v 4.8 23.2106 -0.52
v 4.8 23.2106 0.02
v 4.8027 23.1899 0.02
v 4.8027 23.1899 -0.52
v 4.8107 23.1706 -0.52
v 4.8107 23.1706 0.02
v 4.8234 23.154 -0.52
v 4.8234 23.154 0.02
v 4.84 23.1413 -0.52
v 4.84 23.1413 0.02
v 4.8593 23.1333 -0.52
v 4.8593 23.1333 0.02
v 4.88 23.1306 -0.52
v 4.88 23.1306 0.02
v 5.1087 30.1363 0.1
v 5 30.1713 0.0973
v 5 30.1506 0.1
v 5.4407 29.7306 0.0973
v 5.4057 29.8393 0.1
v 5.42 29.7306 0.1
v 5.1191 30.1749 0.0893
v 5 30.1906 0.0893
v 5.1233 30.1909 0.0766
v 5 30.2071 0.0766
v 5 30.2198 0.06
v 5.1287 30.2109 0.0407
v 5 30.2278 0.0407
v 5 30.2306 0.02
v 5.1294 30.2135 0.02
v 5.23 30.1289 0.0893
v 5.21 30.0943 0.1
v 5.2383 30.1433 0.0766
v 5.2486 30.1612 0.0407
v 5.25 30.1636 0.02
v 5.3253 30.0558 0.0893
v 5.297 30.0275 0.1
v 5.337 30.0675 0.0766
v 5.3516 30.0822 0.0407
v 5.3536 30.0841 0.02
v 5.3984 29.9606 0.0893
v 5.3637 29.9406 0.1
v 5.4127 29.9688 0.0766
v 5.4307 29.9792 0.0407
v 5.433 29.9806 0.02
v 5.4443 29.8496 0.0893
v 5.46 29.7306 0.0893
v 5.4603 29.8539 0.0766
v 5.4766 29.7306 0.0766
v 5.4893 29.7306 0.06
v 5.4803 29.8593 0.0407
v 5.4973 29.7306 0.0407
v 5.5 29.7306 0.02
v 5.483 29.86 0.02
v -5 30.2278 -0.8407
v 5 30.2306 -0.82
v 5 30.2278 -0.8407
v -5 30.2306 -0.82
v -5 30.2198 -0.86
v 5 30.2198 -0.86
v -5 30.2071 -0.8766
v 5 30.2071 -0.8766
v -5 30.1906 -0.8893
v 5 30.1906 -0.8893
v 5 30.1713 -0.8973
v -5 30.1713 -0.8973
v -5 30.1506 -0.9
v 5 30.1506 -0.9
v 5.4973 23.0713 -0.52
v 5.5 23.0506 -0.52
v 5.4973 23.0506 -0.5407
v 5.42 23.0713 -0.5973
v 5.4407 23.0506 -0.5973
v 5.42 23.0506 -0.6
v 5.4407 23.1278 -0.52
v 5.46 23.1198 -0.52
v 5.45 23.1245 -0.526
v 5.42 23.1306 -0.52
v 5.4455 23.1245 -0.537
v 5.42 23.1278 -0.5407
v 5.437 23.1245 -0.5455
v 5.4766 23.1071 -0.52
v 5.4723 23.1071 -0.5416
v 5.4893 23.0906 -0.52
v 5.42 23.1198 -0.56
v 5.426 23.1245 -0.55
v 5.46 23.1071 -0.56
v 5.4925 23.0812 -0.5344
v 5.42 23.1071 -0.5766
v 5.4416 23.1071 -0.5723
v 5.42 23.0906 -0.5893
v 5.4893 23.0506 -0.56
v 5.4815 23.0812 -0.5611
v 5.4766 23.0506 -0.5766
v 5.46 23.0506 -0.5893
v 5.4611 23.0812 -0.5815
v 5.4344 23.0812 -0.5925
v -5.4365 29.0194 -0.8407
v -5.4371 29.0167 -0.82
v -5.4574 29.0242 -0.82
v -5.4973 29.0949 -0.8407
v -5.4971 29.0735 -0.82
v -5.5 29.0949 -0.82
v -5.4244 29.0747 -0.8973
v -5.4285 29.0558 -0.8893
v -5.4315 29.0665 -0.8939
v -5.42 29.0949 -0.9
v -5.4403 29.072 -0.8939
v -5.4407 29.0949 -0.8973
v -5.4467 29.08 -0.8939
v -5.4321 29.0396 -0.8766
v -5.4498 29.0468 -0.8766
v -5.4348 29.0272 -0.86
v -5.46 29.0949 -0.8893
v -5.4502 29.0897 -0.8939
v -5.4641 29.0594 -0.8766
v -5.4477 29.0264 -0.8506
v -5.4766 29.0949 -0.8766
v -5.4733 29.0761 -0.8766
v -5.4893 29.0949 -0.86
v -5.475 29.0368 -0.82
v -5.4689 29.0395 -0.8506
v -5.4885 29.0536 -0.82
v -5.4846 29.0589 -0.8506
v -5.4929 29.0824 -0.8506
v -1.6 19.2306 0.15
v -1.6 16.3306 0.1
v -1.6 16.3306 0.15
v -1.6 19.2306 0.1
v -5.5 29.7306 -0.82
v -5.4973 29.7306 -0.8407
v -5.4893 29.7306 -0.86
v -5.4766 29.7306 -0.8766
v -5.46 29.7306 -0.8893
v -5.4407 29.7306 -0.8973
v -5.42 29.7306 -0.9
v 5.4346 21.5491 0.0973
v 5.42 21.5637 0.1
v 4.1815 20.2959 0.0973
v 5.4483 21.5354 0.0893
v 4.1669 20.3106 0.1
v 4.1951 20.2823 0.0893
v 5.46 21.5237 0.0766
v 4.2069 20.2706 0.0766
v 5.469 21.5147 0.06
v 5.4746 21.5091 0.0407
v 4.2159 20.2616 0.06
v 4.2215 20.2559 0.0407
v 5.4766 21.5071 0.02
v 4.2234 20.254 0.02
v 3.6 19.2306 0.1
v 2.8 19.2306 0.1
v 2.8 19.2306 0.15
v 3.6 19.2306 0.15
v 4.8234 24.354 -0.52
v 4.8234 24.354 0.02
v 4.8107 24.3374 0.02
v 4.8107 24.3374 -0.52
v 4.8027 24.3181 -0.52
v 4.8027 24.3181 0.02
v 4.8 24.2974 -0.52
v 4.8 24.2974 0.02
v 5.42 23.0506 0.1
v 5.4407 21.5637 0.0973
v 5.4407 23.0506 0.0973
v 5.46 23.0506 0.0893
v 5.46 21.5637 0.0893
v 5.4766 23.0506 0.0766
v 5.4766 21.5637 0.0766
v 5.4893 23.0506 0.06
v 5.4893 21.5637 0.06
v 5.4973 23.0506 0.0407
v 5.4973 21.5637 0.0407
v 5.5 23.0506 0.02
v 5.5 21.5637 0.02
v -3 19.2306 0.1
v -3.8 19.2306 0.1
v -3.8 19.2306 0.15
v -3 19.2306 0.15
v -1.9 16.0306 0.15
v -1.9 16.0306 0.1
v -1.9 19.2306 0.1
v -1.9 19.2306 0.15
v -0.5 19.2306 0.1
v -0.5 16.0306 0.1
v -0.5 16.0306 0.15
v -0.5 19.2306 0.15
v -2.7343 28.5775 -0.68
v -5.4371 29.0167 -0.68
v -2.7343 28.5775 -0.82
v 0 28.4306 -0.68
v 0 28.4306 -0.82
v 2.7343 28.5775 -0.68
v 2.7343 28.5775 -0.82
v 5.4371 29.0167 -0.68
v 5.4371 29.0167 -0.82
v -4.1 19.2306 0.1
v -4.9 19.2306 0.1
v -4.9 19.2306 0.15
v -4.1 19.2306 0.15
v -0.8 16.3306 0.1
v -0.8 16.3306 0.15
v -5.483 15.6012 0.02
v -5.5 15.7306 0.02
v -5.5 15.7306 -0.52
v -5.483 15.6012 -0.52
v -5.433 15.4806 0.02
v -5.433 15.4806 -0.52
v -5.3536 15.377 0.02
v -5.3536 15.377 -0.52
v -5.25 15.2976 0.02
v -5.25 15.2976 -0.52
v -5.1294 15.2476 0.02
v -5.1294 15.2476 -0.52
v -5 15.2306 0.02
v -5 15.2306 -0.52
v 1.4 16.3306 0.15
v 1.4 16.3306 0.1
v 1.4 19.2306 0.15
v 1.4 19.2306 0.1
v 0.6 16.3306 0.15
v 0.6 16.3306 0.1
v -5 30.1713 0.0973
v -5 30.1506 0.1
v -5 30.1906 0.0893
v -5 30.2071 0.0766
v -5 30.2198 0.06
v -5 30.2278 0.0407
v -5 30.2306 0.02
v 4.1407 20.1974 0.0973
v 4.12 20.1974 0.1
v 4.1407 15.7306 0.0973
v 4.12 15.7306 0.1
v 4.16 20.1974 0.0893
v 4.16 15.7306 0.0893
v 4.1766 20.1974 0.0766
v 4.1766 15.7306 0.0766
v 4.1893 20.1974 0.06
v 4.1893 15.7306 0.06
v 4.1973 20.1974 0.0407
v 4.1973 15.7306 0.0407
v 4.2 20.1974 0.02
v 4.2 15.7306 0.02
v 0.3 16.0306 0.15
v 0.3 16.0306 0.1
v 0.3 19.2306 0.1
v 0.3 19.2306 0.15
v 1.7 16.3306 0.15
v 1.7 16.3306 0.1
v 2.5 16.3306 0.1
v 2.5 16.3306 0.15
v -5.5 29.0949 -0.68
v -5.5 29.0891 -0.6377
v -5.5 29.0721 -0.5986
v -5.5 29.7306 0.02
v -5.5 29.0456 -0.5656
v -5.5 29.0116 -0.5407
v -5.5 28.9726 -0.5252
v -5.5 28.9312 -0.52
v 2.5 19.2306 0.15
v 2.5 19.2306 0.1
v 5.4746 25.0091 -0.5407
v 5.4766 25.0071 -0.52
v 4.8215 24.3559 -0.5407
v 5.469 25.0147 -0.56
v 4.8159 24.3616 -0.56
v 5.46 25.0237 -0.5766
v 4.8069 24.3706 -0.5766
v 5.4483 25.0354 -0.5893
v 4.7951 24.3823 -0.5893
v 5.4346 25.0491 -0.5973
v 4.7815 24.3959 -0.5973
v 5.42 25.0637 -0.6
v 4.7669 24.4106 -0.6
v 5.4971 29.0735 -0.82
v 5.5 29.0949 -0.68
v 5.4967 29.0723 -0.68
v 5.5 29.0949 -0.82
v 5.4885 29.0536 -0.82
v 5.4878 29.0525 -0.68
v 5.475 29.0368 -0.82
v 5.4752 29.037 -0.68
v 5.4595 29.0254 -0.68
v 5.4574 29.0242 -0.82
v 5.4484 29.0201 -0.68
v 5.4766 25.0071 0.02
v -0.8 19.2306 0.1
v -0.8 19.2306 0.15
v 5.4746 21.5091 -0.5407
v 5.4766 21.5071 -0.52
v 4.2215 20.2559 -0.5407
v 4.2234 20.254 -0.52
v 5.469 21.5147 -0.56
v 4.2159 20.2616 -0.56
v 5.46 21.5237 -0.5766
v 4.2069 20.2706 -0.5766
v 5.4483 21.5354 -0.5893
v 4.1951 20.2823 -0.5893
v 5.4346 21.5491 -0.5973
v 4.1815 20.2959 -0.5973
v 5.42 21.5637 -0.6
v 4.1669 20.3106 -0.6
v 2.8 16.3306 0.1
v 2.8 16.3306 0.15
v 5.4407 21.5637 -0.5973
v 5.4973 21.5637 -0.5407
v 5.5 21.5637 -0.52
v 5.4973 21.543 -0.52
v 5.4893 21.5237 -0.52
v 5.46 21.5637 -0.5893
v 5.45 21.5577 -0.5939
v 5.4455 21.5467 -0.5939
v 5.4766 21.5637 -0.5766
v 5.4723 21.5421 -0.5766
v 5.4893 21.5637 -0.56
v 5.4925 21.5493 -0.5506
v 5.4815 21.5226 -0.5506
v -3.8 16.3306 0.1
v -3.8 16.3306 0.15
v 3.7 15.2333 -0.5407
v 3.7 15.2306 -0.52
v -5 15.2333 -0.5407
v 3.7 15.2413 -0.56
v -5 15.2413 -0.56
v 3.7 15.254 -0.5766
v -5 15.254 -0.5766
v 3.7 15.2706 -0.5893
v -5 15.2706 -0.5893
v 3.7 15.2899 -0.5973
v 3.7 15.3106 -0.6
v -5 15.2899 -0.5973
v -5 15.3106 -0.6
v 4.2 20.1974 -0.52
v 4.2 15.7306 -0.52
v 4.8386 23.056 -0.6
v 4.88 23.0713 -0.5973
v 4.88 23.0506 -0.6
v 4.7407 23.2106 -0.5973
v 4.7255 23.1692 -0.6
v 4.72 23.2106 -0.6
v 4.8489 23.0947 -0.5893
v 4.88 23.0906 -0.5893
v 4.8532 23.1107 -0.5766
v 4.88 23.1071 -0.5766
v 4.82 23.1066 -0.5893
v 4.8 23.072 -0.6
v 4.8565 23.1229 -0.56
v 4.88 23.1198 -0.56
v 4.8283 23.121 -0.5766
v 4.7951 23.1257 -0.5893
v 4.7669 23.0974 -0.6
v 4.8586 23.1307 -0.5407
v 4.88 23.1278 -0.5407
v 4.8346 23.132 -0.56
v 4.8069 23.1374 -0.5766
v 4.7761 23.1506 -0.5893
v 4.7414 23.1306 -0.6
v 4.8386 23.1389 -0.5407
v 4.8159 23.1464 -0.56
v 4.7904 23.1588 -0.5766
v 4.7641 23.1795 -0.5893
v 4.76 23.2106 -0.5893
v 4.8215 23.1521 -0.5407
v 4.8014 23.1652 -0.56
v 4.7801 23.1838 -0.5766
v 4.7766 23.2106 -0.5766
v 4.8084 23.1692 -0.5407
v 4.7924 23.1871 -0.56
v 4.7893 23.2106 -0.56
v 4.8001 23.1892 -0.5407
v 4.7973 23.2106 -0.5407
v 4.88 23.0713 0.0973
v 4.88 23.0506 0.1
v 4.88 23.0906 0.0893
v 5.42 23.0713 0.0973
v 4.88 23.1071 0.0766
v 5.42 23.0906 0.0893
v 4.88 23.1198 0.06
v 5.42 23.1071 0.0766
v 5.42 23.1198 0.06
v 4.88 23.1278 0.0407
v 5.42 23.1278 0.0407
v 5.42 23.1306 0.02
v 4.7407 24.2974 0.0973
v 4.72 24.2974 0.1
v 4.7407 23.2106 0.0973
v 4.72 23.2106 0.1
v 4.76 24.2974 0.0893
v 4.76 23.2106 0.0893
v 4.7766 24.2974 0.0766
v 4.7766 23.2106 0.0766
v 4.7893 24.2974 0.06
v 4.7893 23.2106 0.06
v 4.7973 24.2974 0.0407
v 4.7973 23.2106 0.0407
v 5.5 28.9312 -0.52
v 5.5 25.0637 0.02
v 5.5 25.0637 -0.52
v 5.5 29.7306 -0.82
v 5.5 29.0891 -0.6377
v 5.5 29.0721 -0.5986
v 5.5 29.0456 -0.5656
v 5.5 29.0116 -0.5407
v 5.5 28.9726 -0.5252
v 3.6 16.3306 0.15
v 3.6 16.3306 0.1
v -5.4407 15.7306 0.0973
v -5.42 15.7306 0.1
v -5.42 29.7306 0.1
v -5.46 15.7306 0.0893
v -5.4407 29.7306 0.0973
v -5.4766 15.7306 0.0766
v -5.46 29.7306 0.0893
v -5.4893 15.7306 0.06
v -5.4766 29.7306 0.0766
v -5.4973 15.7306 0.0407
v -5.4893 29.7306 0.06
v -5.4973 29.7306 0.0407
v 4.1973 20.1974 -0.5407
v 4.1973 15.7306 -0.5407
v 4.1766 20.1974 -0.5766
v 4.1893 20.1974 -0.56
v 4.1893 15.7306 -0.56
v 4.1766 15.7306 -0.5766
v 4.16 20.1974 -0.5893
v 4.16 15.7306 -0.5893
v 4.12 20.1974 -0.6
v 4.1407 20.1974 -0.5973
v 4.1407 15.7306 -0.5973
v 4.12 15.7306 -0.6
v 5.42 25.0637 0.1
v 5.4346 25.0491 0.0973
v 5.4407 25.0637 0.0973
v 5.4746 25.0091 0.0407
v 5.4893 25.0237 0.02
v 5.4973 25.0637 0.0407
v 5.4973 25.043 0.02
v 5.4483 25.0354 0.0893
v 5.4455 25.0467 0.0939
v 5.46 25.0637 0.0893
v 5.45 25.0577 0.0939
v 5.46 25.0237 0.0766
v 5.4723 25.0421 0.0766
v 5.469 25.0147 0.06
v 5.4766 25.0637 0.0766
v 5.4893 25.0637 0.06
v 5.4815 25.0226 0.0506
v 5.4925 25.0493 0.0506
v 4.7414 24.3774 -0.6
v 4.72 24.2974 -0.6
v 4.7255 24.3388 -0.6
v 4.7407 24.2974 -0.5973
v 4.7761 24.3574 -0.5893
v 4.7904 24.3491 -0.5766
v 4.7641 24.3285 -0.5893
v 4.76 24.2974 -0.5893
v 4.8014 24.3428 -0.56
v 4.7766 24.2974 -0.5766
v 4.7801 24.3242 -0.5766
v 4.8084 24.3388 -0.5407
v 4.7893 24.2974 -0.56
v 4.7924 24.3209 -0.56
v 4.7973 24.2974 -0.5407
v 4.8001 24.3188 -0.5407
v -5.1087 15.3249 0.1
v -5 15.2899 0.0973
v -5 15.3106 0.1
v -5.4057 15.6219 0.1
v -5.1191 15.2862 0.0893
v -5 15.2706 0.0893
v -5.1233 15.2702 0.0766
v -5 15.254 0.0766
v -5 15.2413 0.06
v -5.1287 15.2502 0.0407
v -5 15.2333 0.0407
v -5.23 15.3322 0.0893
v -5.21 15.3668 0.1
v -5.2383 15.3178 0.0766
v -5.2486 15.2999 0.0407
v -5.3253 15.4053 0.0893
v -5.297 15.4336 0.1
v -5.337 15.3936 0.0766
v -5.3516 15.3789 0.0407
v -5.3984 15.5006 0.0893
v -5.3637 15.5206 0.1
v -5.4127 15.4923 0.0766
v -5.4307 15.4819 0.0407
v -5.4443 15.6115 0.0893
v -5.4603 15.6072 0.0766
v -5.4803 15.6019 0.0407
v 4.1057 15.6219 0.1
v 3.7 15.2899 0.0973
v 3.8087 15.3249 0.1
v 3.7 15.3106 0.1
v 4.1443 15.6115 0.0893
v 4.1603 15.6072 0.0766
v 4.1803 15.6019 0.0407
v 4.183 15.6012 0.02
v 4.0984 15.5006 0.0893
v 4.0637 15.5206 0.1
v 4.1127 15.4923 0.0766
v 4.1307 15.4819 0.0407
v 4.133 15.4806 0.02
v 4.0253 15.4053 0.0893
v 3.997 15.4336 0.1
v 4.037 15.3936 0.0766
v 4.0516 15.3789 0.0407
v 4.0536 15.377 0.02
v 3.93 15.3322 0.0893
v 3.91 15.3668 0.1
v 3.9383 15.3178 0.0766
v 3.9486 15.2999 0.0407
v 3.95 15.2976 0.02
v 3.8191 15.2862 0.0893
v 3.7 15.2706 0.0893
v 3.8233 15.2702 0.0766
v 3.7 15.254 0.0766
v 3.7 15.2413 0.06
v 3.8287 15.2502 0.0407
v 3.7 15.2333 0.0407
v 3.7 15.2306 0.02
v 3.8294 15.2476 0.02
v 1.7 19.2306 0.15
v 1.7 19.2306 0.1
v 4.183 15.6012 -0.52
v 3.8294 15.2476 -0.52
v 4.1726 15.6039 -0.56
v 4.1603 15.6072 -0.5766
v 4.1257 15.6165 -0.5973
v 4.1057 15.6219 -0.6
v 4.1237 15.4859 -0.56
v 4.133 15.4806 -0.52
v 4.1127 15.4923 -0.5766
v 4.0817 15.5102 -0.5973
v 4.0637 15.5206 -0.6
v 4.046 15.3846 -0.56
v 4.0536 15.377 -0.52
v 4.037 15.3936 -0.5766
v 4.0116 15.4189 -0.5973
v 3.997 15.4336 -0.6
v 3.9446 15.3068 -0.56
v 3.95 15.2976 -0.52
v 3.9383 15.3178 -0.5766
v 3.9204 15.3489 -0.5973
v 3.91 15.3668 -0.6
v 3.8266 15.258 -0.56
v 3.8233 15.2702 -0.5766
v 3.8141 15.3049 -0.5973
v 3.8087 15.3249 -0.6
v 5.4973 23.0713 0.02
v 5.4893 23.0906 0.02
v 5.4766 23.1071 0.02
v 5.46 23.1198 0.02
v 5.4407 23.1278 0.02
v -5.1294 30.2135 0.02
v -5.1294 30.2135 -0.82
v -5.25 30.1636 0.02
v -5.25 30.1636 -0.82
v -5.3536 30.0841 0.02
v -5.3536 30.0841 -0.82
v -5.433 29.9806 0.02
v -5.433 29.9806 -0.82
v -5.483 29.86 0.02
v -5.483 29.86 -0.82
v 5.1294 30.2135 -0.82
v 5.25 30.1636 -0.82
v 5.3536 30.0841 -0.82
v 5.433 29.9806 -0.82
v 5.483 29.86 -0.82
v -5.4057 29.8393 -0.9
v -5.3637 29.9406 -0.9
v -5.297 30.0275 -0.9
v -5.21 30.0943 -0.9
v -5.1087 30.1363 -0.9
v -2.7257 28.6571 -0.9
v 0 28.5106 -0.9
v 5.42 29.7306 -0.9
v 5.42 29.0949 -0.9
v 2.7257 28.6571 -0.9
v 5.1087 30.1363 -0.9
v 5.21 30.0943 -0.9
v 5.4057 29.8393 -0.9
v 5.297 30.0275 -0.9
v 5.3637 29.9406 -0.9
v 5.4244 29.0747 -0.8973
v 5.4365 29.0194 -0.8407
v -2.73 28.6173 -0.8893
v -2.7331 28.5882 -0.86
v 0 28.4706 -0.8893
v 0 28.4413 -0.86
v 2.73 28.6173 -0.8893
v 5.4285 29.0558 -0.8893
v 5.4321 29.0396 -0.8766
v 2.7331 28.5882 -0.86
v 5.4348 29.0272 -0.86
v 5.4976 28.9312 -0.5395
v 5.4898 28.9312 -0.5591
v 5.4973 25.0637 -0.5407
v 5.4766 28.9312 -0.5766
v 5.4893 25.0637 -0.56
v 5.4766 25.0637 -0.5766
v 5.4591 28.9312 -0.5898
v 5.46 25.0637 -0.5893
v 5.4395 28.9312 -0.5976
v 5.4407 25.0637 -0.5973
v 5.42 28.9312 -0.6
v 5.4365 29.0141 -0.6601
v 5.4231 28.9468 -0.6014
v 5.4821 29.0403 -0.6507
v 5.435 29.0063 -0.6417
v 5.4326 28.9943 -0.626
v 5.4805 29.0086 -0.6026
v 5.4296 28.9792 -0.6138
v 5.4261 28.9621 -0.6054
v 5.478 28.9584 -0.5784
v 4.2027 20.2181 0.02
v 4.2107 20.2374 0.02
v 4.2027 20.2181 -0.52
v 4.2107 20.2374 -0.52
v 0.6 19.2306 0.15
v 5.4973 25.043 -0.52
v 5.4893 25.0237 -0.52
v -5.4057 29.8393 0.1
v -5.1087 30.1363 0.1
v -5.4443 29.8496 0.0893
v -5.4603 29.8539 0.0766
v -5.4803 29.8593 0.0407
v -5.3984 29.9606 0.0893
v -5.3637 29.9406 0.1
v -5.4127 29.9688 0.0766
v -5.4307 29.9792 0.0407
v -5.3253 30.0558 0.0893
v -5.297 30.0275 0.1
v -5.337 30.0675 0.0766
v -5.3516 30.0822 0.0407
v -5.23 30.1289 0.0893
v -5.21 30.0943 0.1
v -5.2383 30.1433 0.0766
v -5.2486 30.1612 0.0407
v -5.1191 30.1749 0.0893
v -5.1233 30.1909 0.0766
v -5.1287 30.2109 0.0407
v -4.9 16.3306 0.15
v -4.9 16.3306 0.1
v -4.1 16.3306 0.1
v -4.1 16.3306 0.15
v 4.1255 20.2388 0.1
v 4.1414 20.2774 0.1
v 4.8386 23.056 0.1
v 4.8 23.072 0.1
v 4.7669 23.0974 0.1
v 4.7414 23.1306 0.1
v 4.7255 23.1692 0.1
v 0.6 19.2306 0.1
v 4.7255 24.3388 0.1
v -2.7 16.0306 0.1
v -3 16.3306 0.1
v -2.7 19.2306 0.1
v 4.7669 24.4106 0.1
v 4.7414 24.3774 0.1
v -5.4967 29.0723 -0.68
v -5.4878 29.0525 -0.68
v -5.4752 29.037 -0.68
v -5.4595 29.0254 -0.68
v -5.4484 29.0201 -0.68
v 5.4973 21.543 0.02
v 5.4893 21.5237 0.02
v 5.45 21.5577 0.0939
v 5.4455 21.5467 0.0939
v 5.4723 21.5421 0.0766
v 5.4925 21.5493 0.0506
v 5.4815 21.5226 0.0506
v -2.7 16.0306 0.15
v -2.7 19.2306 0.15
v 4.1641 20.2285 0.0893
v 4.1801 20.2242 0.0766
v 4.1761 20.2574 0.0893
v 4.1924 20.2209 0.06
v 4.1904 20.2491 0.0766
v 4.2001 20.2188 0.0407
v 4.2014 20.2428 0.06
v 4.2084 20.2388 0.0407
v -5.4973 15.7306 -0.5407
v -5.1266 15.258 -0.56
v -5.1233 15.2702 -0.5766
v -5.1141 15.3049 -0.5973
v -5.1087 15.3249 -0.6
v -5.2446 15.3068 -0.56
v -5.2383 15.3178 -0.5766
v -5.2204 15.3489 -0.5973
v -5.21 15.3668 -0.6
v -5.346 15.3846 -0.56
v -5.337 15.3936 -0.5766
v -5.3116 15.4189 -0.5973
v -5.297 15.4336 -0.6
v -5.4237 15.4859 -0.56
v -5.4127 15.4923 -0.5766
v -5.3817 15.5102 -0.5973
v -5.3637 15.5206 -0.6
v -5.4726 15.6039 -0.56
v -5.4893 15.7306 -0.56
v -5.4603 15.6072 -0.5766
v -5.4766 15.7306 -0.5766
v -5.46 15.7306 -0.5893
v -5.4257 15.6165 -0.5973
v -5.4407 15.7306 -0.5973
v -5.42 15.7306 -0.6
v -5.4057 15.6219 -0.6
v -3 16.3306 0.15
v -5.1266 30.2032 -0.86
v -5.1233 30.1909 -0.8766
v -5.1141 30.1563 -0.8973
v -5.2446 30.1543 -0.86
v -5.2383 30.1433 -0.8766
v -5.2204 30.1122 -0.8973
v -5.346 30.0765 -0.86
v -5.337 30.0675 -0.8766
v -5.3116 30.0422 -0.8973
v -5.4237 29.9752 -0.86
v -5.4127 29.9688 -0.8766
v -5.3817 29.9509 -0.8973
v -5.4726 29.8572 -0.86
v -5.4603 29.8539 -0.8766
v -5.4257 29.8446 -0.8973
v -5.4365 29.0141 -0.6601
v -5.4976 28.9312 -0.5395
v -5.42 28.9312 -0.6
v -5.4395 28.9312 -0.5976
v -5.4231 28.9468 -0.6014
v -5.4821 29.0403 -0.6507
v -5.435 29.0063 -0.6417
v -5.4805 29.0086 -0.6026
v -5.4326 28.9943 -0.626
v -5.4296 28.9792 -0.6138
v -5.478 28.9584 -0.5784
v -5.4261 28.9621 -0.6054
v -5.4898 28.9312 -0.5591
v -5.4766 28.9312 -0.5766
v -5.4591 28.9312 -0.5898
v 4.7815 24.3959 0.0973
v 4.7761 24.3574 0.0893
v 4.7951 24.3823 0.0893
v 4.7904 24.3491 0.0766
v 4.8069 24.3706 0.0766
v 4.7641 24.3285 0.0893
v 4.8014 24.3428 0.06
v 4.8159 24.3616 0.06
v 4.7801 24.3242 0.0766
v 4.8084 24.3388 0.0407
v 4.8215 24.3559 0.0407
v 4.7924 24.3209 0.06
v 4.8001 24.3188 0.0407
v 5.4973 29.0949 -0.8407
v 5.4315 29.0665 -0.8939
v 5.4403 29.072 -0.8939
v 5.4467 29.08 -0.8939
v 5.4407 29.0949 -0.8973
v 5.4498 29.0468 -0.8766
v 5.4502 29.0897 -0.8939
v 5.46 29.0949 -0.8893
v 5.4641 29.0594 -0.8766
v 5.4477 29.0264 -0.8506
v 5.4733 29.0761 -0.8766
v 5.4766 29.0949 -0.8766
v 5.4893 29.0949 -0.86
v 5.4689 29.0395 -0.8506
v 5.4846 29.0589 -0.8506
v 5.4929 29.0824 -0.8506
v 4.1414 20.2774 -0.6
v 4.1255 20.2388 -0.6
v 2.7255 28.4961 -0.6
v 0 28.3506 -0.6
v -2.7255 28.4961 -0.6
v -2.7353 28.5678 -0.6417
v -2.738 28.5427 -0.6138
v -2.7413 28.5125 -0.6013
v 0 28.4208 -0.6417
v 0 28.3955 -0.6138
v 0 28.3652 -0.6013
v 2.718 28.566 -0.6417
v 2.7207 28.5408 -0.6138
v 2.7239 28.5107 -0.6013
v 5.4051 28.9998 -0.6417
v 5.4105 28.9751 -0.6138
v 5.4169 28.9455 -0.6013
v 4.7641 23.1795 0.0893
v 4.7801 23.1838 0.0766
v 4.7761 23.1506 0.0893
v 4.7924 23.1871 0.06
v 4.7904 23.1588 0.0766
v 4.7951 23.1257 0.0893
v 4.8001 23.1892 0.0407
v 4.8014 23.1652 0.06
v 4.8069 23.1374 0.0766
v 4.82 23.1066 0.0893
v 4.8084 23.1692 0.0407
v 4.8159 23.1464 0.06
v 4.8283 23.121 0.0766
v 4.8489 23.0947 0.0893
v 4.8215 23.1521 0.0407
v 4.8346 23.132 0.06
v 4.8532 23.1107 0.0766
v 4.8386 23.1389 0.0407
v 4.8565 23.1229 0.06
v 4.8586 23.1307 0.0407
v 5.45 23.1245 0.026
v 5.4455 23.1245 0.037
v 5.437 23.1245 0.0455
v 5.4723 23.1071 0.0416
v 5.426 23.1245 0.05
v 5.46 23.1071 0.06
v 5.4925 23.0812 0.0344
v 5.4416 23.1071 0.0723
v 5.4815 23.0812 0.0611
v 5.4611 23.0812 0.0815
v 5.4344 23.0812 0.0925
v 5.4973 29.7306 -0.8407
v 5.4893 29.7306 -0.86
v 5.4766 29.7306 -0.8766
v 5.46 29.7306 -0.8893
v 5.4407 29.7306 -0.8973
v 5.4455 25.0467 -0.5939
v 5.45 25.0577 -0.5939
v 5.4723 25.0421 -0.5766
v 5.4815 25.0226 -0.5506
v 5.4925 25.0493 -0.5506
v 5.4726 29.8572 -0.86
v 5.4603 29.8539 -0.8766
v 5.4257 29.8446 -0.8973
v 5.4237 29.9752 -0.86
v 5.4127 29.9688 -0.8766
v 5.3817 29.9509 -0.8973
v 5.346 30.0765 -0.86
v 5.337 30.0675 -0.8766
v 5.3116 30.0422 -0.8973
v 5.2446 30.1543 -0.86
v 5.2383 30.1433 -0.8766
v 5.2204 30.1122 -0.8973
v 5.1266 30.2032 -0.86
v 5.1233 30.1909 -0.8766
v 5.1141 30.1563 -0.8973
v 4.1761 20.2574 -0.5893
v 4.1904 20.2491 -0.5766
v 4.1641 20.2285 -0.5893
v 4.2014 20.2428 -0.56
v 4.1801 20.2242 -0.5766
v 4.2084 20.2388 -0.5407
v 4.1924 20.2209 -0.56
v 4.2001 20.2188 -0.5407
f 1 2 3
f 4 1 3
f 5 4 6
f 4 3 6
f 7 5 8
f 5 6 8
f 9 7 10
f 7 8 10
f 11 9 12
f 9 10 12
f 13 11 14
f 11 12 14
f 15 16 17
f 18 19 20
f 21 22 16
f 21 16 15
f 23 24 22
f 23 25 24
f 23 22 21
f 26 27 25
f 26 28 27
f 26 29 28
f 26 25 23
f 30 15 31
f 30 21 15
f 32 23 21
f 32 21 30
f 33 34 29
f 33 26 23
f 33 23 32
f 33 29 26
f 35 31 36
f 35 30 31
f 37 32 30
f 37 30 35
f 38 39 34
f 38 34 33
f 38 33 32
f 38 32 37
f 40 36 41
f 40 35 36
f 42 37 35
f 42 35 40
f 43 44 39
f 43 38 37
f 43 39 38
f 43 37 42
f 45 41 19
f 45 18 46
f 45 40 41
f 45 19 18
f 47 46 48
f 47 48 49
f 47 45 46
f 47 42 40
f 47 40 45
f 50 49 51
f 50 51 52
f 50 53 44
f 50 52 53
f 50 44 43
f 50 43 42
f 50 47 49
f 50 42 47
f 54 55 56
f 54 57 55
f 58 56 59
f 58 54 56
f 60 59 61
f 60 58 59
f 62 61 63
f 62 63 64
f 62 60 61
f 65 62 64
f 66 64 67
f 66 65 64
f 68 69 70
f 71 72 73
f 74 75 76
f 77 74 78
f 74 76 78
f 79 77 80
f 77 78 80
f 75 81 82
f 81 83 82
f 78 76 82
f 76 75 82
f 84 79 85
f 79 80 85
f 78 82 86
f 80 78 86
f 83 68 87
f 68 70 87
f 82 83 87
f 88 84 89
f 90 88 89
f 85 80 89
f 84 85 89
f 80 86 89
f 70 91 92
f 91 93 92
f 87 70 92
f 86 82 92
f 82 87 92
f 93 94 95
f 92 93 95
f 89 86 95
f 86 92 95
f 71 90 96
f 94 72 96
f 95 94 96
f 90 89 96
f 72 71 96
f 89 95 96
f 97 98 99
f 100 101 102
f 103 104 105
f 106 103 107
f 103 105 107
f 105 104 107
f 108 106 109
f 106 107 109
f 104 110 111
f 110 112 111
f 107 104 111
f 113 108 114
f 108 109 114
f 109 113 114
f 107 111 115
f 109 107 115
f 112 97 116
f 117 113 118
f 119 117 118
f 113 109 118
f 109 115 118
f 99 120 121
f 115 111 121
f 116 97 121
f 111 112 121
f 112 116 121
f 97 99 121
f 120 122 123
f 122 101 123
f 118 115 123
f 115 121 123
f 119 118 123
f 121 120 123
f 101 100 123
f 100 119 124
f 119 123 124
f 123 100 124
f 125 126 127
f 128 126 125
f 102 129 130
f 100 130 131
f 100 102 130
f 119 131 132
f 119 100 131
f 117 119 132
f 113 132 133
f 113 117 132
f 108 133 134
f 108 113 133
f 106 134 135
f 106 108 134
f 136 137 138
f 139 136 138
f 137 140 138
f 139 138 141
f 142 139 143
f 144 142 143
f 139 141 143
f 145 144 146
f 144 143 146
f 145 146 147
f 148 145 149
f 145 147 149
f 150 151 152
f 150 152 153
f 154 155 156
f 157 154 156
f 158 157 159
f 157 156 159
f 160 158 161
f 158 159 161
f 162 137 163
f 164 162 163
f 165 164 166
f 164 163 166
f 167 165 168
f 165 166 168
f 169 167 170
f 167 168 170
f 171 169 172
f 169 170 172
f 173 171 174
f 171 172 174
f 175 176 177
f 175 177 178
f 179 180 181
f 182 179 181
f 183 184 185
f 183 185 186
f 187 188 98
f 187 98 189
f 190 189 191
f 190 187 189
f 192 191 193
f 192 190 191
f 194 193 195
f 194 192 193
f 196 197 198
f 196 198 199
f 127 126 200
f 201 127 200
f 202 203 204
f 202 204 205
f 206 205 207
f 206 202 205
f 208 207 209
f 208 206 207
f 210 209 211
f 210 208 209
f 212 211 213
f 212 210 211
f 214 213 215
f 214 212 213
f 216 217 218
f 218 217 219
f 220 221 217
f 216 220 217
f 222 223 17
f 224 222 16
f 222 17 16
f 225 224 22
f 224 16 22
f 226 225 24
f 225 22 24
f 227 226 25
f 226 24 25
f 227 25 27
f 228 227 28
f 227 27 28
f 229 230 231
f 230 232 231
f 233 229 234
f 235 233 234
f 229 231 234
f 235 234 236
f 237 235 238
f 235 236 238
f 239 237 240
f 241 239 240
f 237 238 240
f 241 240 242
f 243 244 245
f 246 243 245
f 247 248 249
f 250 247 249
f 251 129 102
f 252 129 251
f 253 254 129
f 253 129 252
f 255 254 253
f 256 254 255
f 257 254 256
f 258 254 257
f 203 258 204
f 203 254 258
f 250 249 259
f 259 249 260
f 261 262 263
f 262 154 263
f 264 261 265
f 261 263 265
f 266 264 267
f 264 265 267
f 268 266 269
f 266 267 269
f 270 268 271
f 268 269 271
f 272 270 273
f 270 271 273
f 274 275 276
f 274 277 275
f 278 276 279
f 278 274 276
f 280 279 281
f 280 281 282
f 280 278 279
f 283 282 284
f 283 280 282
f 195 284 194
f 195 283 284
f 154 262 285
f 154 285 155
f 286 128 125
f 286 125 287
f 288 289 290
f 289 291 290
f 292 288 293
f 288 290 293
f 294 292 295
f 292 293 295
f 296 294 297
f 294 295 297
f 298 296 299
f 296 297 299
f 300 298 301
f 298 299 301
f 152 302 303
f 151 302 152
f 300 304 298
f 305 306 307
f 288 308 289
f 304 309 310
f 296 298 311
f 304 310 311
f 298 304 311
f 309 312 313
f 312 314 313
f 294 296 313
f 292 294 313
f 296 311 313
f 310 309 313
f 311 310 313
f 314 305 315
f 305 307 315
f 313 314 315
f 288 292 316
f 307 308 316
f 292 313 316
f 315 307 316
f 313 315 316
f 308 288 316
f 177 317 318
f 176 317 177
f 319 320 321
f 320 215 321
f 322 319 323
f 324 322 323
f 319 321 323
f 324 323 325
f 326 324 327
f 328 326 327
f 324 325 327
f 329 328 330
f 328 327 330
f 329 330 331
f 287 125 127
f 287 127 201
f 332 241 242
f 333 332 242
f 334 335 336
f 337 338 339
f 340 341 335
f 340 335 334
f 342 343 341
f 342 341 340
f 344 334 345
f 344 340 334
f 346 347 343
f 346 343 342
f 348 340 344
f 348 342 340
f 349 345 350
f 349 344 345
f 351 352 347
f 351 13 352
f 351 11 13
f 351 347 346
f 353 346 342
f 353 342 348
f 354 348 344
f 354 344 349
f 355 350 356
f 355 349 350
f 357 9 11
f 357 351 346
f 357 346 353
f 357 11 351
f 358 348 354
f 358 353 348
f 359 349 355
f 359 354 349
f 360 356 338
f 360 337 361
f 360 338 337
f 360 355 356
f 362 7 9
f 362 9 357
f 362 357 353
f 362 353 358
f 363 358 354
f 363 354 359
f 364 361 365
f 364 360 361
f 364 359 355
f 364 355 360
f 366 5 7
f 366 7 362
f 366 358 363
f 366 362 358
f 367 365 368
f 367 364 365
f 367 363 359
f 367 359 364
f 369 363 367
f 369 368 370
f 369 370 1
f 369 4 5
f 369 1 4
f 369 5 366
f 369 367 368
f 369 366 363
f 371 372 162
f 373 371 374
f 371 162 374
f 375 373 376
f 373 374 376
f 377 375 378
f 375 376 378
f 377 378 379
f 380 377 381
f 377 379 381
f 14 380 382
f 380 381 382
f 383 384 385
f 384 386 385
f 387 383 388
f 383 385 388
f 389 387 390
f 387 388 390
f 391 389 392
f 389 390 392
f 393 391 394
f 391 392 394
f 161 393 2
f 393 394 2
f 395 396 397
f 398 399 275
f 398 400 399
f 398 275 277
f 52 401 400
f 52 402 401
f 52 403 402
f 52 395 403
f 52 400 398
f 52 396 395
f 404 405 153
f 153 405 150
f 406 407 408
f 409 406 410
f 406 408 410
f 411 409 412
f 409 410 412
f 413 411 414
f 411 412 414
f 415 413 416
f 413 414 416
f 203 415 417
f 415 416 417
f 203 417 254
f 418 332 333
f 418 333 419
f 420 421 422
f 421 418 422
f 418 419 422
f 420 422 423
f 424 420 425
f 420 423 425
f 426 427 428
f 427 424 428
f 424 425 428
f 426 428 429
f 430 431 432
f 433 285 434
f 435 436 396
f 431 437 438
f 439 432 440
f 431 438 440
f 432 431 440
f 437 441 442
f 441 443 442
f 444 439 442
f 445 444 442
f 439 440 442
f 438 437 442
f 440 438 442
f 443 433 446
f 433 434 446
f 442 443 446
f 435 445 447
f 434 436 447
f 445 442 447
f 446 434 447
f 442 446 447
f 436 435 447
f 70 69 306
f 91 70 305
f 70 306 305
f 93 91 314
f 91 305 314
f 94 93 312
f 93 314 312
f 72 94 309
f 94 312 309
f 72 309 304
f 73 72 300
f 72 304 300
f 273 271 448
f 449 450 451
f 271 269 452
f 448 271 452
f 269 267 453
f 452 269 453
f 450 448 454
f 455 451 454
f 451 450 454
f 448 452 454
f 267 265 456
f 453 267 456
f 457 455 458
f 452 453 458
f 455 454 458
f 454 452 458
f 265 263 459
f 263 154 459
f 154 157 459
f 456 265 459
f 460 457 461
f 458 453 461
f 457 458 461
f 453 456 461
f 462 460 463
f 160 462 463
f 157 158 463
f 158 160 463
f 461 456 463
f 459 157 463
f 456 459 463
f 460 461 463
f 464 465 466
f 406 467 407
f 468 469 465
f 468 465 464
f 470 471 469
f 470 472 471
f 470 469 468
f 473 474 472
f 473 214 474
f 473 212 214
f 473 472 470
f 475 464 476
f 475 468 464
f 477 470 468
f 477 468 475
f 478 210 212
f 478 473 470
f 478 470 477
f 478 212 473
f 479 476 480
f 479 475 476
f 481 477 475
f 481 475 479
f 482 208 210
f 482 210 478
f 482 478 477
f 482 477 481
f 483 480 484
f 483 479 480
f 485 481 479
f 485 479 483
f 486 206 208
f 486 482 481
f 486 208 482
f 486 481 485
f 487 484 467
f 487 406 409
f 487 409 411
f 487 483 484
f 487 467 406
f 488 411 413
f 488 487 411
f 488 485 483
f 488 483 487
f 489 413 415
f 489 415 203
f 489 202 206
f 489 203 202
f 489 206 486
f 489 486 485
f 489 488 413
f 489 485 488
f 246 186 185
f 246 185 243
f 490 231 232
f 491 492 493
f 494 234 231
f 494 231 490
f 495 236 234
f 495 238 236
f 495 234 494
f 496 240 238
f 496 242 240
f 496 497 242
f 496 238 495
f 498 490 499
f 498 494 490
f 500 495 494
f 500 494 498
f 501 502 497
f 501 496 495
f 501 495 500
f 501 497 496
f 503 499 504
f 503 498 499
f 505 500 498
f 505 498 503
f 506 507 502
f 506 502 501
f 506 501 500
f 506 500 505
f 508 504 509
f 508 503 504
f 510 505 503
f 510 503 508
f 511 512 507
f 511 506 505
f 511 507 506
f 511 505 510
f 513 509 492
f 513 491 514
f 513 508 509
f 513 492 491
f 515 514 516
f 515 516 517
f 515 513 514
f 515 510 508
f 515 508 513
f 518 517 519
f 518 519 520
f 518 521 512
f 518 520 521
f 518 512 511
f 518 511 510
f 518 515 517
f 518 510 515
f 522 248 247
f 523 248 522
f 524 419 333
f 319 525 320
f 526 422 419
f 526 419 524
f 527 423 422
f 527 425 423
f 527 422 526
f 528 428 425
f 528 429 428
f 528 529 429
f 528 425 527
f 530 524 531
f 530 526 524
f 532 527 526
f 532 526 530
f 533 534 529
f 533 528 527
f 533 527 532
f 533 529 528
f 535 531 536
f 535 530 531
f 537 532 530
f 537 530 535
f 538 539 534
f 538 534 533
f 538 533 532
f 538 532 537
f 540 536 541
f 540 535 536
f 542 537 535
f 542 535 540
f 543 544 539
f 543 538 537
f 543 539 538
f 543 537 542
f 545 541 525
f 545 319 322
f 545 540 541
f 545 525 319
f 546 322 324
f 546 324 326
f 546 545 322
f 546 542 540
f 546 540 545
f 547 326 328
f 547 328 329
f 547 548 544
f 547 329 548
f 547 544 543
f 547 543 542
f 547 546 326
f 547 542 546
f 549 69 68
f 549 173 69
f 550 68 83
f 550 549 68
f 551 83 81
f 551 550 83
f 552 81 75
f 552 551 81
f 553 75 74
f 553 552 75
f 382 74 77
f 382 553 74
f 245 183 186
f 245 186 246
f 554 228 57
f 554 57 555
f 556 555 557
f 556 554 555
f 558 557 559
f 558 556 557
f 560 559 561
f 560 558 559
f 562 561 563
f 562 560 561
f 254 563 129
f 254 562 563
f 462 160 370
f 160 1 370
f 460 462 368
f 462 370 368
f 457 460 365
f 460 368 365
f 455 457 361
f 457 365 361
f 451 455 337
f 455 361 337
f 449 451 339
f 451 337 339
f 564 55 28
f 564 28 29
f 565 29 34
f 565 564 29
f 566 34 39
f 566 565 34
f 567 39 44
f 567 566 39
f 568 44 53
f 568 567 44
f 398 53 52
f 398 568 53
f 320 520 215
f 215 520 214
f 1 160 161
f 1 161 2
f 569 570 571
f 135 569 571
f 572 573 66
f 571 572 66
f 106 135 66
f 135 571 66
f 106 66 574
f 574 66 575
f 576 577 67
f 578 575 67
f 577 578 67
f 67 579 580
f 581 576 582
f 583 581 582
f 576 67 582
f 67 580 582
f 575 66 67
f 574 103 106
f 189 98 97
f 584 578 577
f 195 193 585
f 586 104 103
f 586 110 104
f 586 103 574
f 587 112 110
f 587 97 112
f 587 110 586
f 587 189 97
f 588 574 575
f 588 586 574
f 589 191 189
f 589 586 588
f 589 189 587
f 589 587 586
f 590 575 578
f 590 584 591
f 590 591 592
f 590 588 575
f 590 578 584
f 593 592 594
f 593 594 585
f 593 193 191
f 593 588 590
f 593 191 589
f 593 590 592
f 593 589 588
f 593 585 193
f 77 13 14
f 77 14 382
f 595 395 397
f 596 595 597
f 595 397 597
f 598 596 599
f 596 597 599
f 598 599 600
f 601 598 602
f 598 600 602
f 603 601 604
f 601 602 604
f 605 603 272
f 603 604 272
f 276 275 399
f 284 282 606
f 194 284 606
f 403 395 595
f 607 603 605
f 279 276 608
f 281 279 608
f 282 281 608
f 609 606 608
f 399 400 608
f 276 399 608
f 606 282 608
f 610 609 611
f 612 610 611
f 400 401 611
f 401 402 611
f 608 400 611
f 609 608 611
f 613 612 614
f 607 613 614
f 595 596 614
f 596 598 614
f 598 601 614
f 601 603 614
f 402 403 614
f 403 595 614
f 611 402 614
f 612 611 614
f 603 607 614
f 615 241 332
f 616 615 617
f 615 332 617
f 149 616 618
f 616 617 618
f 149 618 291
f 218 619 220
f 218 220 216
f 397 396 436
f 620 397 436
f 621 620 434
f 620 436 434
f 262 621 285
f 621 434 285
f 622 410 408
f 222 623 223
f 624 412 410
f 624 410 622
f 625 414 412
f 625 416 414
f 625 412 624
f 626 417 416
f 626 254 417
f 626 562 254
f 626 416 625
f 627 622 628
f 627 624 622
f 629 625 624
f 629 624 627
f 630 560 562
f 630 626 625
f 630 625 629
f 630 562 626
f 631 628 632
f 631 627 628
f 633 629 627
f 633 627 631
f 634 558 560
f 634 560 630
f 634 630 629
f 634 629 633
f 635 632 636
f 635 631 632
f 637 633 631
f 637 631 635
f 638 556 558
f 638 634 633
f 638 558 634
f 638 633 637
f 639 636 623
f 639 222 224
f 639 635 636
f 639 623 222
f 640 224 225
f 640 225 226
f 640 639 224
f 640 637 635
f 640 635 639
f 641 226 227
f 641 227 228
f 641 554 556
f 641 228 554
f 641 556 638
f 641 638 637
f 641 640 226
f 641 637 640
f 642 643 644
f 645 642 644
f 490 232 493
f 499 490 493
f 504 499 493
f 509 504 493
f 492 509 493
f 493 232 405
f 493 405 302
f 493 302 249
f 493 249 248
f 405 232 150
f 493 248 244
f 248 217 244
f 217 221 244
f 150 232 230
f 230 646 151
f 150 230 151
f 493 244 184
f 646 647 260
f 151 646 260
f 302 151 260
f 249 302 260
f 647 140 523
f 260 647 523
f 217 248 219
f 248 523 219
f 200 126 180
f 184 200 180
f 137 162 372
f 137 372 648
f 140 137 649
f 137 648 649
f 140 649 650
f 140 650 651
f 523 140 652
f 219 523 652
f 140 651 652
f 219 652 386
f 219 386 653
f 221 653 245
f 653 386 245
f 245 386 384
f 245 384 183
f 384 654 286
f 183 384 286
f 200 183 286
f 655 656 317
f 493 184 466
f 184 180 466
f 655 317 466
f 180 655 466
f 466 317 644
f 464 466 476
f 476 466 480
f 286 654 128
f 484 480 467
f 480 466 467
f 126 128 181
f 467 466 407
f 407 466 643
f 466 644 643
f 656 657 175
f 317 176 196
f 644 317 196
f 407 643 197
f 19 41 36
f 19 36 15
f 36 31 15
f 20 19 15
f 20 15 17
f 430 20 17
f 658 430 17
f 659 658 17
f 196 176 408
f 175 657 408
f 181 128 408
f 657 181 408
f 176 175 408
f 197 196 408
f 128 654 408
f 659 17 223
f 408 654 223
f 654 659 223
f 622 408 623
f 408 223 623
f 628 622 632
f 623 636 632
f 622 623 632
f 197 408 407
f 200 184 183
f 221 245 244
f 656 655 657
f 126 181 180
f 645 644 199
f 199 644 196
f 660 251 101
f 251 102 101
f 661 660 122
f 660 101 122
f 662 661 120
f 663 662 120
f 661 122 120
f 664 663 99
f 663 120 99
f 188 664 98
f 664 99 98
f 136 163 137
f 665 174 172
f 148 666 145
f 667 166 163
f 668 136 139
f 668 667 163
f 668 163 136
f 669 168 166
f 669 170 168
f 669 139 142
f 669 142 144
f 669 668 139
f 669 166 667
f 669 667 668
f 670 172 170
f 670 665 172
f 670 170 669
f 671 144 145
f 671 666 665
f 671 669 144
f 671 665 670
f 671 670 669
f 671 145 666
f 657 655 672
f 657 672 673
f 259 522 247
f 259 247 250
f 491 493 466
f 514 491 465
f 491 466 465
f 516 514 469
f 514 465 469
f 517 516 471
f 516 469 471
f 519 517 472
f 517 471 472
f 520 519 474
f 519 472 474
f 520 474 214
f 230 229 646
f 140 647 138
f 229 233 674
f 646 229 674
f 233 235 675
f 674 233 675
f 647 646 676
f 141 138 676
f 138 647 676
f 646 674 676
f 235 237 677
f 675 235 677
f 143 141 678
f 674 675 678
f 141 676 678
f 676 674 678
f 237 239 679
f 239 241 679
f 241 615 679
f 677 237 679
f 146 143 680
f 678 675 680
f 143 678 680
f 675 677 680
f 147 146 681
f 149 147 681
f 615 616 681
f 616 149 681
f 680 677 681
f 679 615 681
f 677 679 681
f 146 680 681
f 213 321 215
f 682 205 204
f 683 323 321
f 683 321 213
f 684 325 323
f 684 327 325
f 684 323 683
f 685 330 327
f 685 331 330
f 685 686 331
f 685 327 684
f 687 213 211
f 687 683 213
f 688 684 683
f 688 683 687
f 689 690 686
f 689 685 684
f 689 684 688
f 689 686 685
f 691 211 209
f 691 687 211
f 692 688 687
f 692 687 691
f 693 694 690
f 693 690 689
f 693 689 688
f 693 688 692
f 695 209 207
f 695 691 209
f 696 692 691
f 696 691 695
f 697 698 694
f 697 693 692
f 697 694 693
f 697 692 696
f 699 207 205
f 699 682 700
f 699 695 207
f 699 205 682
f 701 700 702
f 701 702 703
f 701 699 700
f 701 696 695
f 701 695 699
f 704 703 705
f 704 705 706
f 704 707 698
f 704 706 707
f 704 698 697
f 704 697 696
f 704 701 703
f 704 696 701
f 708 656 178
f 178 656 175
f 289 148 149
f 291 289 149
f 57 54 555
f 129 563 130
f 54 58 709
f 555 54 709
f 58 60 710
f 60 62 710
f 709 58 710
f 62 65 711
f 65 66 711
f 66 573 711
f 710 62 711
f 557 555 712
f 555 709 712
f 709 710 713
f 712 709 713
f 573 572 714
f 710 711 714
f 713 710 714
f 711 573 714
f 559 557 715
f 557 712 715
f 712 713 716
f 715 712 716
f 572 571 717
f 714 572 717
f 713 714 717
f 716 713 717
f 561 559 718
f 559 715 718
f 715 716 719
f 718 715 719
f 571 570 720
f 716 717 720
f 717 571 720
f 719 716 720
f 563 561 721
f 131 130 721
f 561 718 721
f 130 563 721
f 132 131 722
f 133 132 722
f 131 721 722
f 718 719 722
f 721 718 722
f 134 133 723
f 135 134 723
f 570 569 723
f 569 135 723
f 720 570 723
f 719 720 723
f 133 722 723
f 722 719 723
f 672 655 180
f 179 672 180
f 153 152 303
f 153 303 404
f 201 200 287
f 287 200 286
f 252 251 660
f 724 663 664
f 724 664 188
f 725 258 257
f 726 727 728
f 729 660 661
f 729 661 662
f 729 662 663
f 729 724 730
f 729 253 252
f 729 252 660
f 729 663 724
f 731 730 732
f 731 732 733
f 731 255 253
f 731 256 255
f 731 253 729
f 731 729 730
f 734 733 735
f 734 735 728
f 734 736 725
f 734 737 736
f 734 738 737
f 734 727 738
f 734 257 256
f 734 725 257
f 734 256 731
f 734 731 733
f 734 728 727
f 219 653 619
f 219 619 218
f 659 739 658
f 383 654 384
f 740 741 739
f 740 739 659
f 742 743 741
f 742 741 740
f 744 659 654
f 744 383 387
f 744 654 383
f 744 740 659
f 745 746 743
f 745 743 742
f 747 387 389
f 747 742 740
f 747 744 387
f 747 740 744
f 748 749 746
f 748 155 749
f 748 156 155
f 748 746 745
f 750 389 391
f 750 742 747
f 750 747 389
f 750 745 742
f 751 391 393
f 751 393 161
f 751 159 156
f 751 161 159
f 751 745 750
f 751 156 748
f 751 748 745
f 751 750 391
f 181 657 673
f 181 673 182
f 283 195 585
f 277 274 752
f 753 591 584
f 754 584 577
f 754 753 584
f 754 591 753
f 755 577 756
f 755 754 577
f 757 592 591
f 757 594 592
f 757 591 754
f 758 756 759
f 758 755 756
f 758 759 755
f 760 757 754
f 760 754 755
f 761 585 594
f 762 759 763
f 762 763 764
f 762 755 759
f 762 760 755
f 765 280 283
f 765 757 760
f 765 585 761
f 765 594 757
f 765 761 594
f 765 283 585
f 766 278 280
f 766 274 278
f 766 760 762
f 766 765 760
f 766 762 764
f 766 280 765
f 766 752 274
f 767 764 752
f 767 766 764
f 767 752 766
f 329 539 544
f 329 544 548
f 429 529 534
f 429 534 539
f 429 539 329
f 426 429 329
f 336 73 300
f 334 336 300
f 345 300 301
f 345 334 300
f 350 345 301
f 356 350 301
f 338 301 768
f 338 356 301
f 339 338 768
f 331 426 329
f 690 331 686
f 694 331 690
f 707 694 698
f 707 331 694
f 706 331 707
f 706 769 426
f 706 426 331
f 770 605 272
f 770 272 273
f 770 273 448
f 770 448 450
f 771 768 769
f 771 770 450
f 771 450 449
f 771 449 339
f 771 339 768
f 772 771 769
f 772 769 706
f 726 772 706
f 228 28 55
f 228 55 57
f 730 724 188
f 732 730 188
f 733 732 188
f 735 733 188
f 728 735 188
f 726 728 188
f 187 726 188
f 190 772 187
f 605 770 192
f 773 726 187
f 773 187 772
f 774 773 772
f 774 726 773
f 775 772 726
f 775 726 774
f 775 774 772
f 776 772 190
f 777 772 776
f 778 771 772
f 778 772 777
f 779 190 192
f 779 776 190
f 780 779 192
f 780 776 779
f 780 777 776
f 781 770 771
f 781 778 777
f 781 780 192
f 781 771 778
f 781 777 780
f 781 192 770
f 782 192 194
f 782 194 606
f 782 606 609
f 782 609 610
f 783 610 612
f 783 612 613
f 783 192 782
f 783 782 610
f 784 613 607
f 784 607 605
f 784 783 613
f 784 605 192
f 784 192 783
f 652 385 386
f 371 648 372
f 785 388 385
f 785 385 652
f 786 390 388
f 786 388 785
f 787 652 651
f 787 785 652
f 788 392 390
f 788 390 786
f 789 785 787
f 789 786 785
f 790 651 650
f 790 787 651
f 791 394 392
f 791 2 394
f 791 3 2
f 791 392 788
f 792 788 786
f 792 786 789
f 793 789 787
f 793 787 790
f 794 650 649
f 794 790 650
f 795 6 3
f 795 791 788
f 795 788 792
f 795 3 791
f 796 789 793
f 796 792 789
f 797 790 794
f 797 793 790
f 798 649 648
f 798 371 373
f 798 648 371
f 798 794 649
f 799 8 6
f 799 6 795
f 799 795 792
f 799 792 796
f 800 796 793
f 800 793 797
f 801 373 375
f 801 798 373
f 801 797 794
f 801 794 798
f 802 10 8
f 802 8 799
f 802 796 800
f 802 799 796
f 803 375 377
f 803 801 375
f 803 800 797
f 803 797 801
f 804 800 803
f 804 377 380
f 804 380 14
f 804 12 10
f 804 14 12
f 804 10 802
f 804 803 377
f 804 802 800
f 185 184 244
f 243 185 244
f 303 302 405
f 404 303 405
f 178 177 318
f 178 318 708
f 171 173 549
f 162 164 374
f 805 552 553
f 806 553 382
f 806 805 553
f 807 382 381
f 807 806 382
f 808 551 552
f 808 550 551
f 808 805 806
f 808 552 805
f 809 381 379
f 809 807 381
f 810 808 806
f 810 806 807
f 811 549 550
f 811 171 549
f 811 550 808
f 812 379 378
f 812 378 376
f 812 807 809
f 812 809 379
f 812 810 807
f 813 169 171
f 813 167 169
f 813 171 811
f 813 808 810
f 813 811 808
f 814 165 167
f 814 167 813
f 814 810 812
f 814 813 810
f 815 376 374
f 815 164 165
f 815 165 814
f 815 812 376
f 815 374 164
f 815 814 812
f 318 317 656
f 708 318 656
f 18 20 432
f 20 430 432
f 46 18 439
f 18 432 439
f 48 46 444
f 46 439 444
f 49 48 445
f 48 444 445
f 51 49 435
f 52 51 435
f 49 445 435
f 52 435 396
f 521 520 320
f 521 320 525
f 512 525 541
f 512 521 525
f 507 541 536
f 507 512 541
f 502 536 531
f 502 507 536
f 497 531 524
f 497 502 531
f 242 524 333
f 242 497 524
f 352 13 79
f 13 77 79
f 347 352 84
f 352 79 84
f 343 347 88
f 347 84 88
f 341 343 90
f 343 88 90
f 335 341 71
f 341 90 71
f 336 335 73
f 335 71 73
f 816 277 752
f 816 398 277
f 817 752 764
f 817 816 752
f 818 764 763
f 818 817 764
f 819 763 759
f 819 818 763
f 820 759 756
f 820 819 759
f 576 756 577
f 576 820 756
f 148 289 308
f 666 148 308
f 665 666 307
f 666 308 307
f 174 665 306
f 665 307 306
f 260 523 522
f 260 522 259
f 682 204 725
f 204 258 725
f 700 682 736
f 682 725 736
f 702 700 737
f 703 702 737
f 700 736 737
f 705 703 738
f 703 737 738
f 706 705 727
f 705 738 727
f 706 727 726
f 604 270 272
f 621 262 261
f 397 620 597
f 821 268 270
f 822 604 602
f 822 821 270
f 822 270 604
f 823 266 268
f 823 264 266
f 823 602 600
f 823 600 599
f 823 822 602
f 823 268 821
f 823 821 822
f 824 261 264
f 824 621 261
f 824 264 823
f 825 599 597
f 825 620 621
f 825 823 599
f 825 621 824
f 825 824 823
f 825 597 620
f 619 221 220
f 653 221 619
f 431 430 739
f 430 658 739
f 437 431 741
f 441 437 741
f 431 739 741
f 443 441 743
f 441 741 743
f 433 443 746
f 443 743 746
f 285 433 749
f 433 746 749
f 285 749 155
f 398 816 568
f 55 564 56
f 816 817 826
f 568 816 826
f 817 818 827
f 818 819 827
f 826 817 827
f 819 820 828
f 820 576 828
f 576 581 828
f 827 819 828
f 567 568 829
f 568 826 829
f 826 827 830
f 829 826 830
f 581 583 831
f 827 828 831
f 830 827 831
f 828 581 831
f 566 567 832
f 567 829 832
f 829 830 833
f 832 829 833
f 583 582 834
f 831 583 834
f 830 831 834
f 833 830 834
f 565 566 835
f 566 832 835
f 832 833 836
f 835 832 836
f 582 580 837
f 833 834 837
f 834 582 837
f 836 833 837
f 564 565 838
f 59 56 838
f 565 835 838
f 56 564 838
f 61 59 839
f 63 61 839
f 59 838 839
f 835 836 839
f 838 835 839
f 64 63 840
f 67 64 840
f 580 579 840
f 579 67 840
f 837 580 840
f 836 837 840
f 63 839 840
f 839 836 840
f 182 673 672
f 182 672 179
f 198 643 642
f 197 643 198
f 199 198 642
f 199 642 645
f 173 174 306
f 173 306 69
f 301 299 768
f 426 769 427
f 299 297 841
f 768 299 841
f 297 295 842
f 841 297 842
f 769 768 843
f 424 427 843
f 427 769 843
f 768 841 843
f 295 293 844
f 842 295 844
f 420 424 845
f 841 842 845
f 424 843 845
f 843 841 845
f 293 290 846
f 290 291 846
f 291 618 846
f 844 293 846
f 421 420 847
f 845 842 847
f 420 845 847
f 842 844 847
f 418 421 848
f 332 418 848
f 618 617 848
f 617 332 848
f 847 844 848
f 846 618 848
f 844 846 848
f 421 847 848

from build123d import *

# Parameters (mm, degrees)
BOSS_EXTRUDE1_DEPTH      = 0.1
BOSS_EXTRUDE1_DEPTH_BACK = 0.6
BOSS_EXTRUDE2_DEPTH      = 0.3
SKETCH3_W                = 0.8
SKETCH3_H                = 2.9
SKETCH3_H_2              = 3.2
BOSS_EXTRUDE3_DEPTH      = 0.05
CUT_EXTRUDE1_DEPTH       = 0.7
FILLET1_R                = 0.5
FILLET2_R                = 0.08


with BuildPart() as part:
    # Sketch1 → Boss-Extrude1 (new body, two sides)
    with BuildSketch(Plane.XY) as boss_extrude1_sk:
        Polygon((-5.5, 30.230563632), (5.5, 30.230563632), (5.5, 21.530563632), (4.2, 20.230563632), (4.2, 15.230563632), (-5.5, 15.230563632), align=None)
    extrude(amount=BOSS_EXTRUDE1_DEPTH)
    extrude(boss_extrude1_sk.sketch, amount=-BOSS_EXTRUDE1_DEPTH_BACK)

    # Sketch2 → Boss-Extrude2 (add)
    with BuildSketch(Plane(origin=(0, 0, -0.6), x_dir=(-1, 0, 0), z_dir=(0, 0, -1))):
        with BuildLine():
            Line((-5.5, 30.230563632), (5.5, 30.230563632))
            Line((5.5, 30.230563632), (5.5, 29.030563632))
            ThreePointArc((5.5, 29.030563632), (0, 28.430563632), (-5.5, 29.030563632))
            Line((-5.5, 29.030563632), (-5.5, 30.230563632))
        make_face()
    extrude(amount=BOSS_EXTRUDE2_DEPTH)

    # Sketch3 → Boss-Extrude3 (add)
    with BuildSketch(Plane.XY.offset(0.1)):
        with Locations((-4.5, 17.780563632)):
            Rectangle(SKETCH3_W, SKETCH3_H)
        with Locations((3.2, 17.780563632)):
            Rectangle(SKETCH3_W, SKETCH3_H)
        with Locations((-3.4, 17.780563632)):
            Rectangle(SKETCH3_W, SKETCH3_H)
        with Locations((-1.2, 17.780563632)):
            Rectangle(SKETCH3_W, SKETCH3_H)
        with Locations((1, 17.780563632)):
            Rectangle(SKETCH3_W, SKETCH3_H)
        with Locations((2.1, 17.780563632)):
            Rectangle(SKETCH3_W, SKETCH3_H)
        with Locations((-2.3, 17.630563632)):
            Rectangle(SKETCH3_W, SKETCH3_H_2)
        with Locations((-0.1, 17.630563632)):
            Rectangle(SKETCH3_W, SKETCH3_H_2)
    extrude(amount=BOSS_EXTRUDE3_DEPTH)

    # Sketch4 → Cut-Extrude1 (cut)
    with BuildSketch(Plane(origin=(0, 0, -0.6), x_dir=(-1, 0, 0), z_dir=(0, 0, -1))):
        Polygon((-5.5, 23.130563632), (-5.5, 25.030563632), (-4.8, 24.330563632), (-4.8, 23.130563632), align=None)
    extrude(amount=-CUT_EXTRUDE1_DEPTH, mode=Mode.SUBTRACT)

    # Fillet1
    fillet1_edges = [part.edges().sort_by_distance(p)[0] for p in [
        (-5.5, 15.230563632, -0.25),
        (-5.5, 30.230563632, -0.4),
        (5.5, 30.230563632, -0.4),
        (4.2, 15.230563632, -0.25),
    ]]
    fillet(fillet1_edges, radius=FILLET1_R)

    # Fillet2
    fillet2_edges = [part.edges().sort_by_distance(p)[0] for p in [
        (4.85, 20.880563632, 0.1),
        (5.5, 21.530563632, -0.25),
        (4.2, 20.230563632, -0.25),
        (5.5, 22.330563632, 0.1),
        (5.5, 22.330563632, -0.6),
        (4.85, 20.880563632, -0.6),
        (5.5, 27.030563632, -0.6),
        (5.5, 27.380563632, 0.1),
        (5.5, 25.030563632, -0.25),
        (4.8, 24.330563632, -0.25),
        (4.8, 23.130563632, -0.25),
        (5.5, 23.130563632, -0.25),
        (5.15, 24.680563632, -0.6),
        (5.15, 23.130563632, -0.6),
        (4.8, 23.730563632, -0.6),
        (5.15, 24.680563632, 0.1),
        (4.8, 23.730563632, 0.1),
        (5.15, 23.130563632, 0.1),
        (0, 30.230563632, -0.9),
        (0, 30.230563632, 0.1),
        (5.5, 29.380563632, -0.9),
        (-5.353553391, 30.084117023, -0.9),
        (5.353553391, 30.084117023, -0.9),
        (-5.5, 22.730563632, 0.1),
        (-0.65, 15.230563632, 0.1),
        (4.2, 17.980563632, 0.1),
        (4.053553391, 15.377010242, 0.1),
        (-5.353553391, 15.377010242, 0.1),
        (-5.353553391, 30.084117023, 0.1),
        (5.353553391, 30.084117023, 0.1),
        (-0.65, 15.230563632, -0.6),
        (4.2, 17.980563632, -0.6),
        (4.053553391, 15.377010242, -0.6),
        (-5.353553391, 15.377010242, -0.6),
        (-5.5, 22.380563632, -0.6),
        (0, 28.430563632, -0.6),
        (5.5, 29.030563632, -0.75),
        (-5.5, 29.030563632, -0.75),
        (0, 28.430563632, -0.9),
        (-5.5, 29.380563632, -0.9),
    ]]
    fillet(fillet2_edges, radius=FILLET2_R)


solid = part.part
